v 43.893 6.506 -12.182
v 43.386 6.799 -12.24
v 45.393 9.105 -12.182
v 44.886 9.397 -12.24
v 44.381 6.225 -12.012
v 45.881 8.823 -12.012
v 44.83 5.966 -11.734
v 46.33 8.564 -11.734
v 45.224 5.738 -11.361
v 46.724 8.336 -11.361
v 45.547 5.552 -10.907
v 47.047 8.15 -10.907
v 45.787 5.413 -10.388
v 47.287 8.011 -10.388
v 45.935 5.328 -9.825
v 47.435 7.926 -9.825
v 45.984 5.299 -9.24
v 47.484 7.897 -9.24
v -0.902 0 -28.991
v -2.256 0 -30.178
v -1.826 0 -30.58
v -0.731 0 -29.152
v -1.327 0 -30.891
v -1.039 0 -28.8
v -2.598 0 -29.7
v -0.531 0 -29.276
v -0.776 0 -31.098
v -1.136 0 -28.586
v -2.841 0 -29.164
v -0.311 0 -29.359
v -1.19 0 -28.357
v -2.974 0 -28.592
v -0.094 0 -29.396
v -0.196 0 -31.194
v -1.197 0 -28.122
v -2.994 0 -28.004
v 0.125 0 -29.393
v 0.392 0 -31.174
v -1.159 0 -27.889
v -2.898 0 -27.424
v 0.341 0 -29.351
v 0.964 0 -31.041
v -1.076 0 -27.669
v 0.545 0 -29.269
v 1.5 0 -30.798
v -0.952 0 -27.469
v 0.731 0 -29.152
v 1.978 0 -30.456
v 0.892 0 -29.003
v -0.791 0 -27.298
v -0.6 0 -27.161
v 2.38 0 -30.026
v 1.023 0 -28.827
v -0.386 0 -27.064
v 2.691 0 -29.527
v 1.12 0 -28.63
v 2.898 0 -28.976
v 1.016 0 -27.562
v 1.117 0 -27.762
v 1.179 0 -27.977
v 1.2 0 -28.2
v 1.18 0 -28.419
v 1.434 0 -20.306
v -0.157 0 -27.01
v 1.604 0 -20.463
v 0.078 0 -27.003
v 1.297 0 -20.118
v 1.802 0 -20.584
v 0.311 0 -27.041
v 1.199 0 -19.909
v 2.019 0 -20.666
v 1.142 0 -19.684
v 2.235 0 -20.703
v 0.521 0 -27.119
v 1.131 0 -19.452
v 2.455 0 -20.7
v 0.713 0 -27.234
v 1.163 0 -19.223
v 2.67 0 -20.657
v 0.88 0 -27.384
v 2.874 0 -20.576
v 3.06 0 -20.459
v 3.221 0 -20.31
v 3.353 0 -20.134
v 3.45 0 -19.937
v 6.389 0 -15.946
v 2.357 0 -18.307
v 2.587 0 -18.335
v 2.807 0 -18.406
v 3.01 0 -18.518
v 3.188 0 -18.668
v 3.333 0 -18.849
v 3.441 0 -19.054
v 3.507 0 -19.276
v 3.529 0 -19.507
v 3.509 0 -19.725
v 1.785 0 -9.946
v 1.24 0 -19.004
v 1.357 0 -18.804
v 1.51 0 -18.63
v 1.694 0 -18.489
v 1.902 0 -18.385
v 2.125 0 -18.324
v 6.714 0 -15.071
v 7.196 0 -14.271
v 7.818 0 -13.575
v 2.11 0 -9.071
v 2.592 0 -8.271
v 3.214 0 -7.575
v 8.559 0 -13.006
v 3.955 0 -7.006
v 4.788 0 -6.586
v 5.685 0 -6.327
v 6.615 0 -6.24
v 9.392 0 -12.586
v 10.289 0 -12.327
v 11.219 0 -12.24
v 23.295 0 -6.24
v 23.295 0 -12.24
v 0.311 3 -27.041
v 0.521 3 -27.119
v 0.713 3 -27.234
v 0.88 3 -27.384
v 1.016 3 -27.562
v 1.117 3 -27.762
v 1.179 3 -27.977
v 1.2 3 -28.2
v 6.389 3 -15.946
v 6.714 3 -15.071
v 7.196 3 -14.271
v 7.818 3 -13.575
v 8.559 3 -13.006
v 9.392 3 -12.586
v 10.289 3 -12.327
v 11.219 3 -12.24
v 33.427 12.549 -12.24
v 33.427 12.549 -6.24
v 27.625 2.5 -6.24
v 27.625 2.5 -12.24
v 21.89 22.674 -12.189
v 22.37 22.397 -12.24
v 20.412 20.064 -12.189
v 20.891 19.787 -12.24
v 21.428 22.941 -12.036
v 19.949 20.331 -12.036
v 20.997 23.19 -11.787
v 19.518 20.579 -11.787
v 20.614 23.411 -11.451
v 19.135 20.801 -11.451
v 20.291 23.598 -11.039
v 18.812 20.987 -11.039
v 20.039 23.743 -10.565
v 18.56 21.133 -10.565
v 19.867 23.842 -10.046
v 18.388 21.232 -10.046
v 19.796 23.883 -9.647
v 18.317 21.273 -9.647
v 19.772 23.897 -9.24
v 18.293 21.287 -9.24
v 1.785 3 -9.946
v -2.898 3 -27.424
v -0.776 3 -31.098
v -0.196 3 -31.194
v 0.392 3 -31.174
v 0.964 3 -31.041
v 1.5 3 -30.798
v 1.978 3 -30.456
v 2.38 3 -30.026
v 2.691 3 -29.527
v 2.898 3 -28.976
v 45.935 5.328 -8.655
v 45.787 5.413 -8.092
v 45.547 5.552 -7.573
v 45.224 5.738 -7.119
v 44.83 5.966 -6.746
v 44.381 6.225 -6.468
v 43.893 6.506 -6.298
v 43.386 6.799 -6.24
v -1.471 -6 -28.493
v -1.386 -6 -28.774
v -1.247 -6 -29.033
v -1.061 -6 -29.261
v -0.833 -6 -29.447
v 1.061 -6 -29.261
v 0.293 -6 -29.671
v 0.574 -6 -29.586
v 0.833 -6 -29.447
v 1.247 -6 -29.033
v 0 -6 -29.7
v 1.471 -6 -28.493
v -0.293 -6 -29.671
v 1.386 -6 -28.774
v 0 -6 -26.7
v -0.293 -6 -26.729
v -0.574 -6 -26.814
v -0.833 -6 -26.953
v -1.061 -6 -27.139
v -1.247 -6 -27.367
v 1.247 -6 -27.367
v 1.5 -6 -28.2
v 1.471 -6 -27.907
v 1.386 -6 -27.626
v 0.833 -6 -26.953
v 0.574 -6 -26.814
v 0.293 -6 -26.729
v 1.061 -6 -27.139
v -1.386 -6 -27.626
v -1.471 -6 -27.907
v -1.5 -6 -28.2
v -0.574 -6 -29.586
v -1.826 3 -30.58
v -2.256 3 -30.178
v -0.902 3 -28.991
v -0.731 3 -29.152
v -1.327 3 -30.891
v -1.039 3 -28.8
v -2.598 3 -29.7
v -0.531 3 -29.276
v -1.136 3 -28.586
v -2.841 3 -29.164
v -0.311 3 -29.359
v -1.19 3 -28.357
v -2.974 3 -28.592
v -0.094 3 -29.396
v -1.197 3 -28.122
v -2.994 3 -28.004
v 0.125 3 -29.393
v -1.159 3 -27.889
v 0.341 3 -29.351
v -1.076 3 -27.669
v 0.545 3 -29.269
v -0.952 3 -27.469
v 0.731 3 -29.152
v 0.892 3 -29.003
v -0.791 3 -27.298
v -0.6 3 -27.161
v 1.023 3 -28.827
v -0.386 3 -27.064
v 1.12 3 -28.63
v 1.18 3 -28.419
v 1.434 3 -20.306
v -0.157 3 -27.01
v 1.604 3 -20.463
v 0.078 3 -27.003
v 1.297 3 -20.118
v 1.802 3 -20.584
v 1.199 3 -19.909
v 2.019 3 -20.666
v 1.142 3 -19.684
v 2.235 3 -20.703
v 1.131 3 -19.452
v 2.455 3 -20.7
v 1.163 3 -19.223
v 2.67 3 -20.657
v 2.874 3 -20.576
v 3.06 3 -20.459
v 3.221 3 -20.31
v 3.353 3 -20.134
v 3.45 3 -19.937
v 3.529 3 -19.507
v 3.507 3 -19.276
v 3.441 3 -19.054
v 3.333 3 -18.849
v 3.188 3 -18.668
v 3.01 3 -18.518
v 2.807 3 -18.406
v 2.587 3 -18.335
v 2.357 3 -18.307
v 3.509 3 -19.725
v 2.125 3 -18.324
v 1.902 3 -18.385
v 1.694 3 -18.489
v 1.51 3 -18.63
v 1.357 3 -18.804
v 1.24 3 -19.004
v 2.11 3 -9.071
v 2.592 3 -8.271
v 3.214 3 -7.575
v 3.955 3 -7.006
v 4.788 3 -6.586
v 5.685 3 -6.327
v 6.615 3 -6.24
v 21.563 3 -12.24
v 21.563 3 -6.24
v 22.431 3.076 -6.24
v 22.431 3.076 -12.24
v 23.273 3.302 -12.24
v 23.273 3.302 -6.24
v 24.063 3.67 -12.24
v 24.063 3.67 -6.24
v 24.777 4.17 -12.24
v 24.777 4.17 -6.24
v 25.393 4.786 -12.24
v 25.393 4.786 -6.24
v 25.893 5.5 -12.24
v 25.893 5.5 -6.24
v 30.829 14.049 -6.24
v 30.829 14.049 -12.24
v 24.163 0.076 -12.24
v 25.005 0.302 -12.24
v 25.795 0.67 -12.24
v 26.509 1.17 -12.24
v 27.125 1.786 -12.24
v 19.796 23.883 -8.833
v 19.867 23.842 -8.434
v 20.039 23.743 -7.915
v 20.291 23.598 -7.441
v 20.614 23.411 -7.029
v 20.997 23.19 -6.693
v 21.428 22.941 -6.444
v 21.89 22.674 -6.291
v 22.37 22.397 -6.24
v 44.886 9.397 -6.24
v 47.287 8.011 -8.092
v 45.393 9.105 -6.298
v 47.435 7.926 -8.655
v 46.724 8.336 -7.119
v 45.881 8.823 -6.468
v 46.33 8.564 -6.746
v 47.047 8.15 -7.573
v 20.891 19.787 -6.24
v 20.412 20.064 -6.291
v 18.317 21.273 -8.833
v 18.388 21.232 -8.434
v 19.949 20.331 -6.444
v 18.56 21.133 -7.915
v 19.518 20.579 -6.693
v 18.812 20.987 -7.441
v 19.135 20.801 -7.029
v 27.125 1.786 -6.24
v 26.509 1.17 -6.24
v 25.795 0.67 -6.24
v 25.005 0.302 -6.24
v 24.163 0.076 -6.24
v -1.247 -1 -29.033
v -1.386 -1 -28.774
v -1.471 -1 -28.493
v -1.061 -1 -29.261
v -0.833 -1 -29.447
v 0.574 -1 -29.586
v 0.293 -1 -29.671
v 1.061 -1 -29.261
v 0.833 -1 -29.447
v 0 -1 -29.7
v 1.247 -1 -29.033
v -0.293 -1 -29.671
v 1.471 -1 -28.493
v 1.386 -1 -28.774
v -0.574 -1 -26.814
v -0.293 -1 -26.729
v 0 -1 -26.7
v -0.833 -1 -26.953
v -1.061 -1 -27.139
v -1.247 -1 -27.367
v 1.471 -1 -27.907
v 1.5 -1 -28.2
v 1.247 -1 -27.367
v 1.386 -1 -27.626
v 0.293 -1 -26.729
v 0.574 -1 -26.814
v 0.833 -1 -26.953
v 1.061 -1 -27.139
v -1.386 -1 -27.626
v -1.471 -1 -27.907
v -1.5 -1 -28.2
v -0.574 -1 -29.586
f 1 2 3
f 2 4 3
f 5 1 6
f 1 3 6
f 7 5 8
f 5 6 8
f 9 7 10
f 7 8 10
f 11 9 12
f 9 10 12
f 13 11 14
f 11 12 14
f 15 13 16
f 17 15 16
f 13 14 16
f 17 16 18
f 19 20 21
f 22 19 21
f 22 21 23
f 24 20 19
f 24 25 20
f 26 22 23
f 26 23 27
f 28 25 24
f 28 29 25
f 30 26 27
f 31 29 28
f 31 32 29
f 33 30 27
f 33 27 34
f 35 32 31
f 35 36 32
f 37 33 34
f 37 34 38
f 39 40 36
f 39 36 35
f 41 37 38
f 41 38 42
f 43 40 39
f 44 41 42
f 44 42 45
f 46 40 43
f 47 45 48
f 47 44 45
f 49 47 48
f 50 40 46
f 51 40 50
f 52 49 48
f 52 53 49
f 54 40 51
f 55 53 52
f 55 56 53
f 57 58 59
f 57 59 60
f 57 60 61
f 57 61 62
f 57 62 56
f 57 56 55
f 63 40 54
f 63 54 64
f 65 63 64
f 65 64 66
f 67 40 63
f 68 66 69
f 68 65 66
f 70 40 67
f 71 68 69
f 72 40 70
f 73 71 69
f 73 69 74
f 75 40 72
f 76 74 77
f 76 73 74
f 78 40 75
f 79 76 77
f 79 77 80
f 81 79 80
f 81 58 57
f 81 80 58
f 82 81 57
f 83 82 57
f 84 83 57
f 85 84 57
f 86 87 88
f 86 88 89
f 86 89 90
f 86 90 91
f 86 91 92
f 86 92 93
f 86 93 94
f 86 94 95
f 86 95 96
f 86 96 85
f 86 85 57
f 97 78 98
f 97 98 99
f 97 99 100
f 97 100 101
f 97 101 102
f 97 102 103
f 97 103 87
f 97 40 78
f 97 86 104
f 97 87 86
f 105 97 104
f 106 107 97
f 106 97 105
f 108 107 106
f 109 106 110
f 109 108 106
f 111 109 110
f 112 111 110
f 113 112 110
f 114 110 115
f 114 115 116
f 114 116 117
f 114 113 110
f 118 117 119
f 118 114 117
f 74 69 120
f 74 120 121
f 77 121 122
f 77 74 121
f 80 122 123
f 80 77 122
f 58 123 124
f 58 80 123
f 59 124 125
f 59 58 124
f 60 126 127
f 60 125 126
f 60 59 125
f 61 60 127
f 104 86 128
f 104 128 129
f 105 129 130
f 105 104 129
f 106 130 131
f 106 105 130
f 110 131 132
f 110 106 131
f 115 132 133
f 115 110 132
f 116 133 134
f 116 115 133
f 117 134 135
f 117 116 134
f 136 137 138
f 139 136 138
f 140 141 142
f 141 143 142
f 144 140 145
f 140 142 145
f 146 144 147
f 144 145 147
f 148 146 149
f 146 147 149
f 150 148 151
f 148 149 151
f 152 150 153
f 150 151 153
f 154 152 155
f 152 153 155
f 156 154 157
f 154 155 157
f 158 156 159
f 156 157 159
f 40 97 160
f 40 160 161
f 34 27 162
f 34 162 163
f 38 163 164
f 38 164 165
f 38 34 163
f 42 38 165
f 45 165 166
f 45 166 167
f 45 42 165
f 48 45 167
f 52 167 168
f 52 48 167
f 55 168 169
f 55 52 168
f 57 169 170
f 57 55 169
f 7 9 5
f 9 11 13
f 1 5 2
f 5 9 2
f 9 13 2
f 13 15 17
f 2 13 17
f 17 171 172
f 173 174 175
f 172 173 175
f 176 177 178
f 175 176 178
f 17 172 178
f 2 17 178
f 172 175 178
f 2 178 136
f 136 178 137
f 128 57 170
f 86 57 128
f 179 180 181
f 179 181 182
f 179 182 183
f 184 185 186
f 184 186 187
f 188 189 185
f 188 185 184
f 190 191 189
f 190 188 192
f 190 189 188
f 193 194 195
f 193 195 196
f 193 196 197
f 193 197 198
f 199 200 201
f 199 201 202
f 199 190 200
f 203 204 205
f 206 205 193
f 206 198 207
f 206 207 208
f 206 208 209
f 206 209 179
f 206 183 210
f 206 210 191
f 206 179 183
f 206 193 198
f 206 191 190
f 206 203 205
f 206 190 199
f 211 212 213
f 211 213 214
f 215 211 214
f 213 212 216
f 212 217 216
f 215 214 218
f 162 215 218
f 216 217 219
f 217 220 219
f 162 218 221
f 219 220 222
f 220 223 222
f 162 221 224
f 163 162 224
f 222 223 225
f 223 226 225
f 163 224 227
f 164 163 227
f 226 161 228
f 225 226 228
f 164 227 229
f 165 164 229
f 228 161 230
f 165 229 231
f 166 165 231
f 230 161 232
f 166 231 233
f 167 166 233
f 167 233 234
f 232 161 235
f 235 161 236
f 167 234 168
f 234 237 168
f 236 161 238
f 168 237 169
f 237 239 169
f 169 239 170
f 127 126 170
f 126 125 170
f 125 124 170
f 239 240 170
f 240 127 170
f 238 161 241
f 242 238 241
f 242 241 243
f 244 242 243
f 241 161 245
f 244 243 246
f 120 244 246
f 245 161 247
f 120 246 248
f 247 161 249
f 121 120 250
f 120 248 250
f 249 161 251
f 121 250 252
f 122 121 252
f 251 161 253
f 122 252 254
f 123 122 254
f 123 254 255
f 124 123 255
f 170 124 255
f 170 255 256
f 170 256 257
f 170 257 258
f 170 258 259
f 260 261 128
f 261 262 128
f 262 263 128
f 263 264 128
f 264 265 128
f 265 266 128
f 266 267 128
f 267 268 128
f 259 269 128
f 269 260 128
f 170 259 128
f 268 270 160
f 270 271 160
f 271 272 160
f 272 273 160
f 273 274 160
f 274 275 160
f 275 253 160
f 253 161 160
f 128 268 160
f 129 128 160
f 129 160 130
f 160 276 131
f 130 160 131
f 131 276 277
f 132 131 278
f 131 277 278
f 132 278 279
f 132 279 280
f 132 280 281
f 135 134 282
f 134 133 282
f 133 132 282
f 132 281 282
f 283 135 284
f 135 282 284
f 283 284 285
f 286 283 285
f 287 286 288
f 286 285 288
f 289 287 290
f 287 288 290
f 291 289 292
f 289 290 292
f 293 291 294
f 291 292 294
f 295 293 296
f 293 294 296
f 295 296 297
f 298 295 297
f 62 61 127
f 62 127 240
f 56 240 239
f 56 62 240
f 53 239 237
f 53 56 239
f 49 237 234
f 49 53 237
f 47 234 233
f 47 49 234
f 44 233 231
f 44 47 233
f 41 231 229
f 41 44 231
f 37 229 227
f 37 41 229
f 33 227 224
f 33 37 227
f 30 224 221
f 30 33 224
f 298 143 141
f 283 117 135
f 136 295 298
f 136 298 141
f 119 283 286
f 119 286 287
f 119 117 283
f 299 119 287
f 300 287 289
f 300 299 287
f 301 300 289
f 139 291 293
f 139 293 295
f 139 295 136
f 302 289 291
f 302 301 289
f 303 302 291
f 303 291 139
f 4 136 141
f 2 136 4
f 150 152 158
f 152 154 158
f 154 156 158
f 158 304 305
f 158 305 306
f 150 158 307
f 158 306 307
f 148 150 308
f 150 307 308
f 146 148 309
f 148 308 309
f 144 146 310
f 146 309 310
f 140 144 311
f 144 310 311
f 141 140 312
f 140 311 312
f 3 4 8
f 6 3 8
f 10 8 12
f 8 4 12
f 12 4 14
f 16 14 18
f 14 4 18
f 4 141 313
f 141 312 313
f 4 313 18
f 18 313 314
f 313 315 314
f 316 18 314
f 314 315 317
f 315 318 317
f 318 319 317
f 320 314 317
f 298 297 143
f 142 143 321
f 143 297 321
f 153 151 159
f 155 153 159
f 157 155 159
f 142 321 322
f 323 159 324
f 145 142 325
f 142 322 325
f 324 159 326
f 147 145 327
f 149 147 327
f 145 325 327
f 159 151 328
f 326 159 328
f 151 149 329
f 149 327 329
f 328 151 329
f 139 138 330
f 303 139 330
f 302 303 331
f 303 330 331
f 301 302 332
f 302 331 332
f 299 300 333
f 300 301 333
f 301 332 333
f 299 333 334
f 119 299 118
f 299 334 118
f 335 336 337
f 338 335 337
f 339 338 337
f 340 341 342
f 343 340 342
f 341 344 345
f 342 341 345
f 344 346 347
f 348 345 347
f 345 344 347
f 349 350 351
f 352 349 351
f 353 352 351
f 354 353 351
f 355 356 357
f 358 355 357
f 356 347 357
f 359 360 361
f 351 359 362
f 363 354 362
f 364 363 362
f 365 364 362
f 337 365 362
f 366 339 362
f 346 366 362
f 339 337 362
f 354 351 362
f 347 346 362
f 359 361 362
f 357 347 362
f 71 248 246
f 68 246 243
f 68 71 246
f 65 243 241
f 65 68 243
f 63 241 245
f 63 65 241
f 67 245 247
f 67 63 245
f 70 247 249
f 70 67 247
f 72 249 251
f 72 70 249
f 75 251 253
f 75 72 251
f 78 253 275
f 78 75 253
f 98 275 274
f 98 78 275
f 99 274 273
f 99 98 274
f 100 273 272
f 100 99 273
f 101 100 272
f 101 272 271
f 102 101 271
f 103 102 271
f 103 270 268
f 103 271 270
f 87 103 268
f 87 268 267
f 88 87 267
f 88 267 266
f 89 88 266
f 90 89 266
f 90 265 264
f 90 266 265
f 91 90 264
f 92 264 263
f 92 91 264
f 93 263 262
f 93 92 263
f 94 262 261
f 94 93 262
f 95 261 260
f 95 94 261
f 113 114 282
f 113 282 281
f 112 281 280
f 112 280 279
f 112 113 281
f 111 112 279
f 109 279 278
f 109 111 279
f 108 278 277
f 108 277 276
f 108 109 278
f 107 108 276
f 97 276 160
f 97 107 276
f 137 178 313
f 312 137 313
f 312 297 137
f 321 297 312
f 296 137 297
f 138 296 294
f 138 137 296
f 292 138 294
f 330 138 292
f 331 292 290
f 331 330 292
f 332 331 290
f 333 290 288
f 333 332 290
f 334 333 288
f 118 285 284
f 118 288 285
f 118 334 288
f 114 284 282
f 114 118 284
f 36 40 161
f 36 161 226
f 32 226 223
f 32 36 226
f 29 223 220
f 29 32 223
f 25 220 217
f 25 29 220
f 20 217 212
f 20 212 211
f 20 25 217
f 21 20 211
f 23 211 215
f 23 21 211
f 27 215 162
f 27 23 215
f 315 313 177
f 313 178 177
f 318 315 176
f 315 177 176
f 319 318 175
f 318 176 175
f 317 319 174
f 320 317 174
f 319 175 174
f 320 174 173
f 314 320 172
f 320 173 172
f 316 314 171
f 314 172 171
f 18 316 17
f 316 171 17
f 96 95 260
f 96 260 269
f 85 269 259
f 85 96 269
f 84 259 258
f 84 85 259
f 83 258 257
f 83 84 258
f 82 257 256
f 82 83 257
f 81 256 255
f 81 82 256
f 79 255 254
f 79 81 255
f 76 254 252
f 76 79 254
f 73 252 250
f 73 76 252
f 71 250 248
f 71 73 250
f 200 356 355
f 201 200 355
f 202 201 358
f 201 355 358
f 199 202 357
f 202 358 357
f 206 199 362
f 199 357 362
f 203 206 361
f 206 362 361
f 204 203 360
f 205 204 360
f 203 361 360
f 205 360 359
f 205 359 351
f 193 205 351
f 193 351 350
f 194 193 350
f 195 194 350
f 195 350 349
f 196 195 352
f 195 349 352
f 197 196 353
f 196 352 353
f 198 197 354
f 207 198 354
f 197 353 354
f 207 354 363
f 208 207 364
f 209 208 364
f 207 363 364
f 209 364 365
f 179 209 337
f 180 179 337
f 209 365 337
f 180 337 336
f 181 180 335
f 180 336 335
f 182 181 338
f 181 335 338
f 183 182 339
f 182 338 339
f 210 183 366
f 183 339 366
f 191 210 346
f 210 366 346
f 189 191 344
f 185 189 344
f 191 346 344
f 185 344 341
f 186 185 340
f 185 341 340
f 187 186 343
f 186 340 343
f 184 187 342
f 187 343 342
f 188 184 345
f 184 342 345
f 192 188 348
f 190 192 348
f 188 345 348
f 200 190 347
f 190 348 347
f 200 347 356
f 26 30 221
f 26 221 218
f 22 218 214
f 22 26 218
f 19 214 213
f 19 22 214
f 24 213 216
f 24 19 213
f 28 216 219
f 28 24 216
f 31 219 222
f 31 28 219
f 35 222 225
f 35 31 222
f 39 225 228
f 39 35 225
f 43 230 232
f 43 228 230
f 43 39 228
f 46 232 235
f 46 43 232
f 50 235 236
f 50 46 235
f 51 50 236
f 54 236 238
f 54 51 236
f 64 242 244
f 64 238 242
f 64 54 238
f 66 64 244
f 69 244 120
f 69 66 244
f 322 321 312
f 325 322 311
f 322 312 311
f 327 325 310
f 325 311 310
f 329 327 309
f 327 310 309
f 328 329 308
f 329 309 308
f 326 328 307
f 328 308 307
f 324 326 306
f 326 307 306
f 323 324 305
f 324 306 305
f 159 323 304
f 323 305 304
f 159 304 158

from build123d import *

# Parameters (mm, degrees)
F3_R     = 1.5
F4_DEPTH = 5
F5_DEPTH = 100
F0_W     = 123.8063722849
F0_H     = 159.0860895813
F6_DEPTH = 31.2010005245
F7_R     = 2.99999


# Not quite as in the source:
# - a fillet or chamfer is up to 0.001 mm smaller than in the source, because OpenCascade refuses the exact size


with BuildPart() as f4:
    # F3 (on offset) → F4 (new body)
    with BuildSketch(Plane.XZ.offset(1)):
        with Locations((0, -28.2000005245)):
            Circle(F3_R)
    extrude(amount=F4_DEPTH)


with BuildPart() as f5:
    # F1 (on Front) → F5 (new body)
    with BuildSketch(Plane.XZ):
        with BuildLine():
            Line((1.7853418934, -9.9459039539), (-2.8977774789, -27.4235433892))
            ThreePointArc((-2.8977774789, -27.4235433892), (-2.5980762114, -29.7000005245), (-0.7764571353, -31.0977780034))
            ThreePointArc((-0.7764571353, -31.0977780034), (1.5, -30.7980767359), (2.8977774789, -28.9764576598))
            Line((2.8977774789, -28.9764576598), (6.3893038213, -15.9459039539))
            ThreePointArc((6.3893038213, -15.9459039539), (8.1751258077, -13.273232478), (11.2189329527, -12.2399991794))
            Line((11.2189329527, -12.2399991794), (56.5063462641, -12.2399991794))
            Line((56.5063462641, -12.2399991794), (56.5063462641, -6.2399991794))
            Line((56.5063462641, -6.2399991794), (6.6149710249, -6.2399991794))
            ThreePointArc((6.6149710249, -6.2399991794), (3.5711638798, -7.273232478), (1.7853418934, -9.9459039539))
        make_face()
        with BuildLine():
            ThreePointArc((1.2, -28.2000005245), (0.7305137148, -29.1520245329), (-0.3105828541, -29.3591115161))
            ThreePointArc((-0.3105828541, -29.3591115161), (-1.1591109915, -27.8894176704), (0.3105828541, -27.040889533))
            ThreePointArc((0.3105828541, -27.040889533), (0.9520240083, -27.4694868097), (1.2, -28.2000005245))
        make_face(mode=Mode.SUBTRACT)
        with BuildLine():
            ThreePointArc((3.5293714059, -19.5066680879), (3.0598851207, -20.4586920963), (2.0187885518, -20.6657790795))
            ThreePointArc((2.0187885518, -20.6657790795), (1.5988576911, -18.5546440796), (3.5293714059, -19.5066680879))
        make_face(mode=Mode.SUBTRACT)
    extrude(amount=-F5_DEPTH)

    # F0 (on Top) → F6 (cut, through all)
    with BuildSketch(Plane.XY):
        with Locations((20.0330018997, 51.0744024068)):
            Rectangle(F0_W, F0_H)
        with BuildLine():
            Line((30.8290268609, 14.0490771528), (18.2928432391, 21.2868461414))
            Line((18.2928432391, 21.2868461414), (19.771658506, 23.8971533641))
            Line((19.771658506, 23.8971533641), (47.4844714271, 7.8971533641))
            Line((47.4844714271, 7.8971533641), (45.9844714271, 5.2990771528))
            Line((45.9844714271, 5.2990771528), (33.4271030722, 12.5490771528))
            Line((33.4271030722, 12.5490771528), (27.625265673, 2.5))
            ThreePointArc((27.625265673, 2.5), (25.7951386541, 0.6698729811), (23.2951386541, 0))
            Line((23.2951386541, 0), (0, 0))
            Line((0, 0), (-9.2670181766, 0))
            Line((-9.2670181766, 0), (-9.2670181766, 3))
            Line((-9.2670181766, 3), (0, 3))
            Line((0, 3), (21.5630878465, 3))
            ThreePointArc((21.5630878465, 3), (24.0630878465, 3.6698729811), (25.8932148654, 5.5))
            Line((25.8932148654, 5.5), (30.8290268609, 14.0490771528))
        make_face(mode=Mode.SUBTRACT)
        with BuildLine():
            ThreePointArc((186.4293499082, 37.2767830718), (189.1206068421, 41.7118372377), (194.29723209, 41.3725432932))
            Line((194.29723209, 41.3725432932), (212.3185770643, 28.7538616935))
            Line((212.3185770643, 28.7538616935), (214.0393063734, 31.2113178264))
            Line((214.0393063734, 31.2113178264), (196.017961399, 43.8299994261))
            ThreePointArc((196.017961399, 43.8299994261), (187.7353610024, 44.3728697372), (183.4293499082, 37.2767830718))
            Line((183.4293499082, 37.2767830718), (183.4293499082, 8.5356936807))
            ThreePointArc((183.4293499082, 8.5356936807), (181.9648838142, 5.0001597747), (178.4293499082, 3.5356936807))
            Line((178.4293499082, 3.5356936807), (134.4964219123, 3.5356936807))
            Line((134.4964219123, 3.5356936807), (134.4964219123, 0.5356936807))
            Line((134.4964219123, 0.5356936807), (178.4293499082, 0.5356936807))
            ThreePointArc((178.4293499082, 0.5356936807), (184.0862041577, 2.8788394312), (186.4293499082, 8.5356936807))
            Line((186.4293499082, 8.5356936807), (186.4293499082, 37.2767830718))
        make_face()
    extrude(amount=-F6_DEPTH, mode=Mode.SUBTRACT)

    # F7 (radius 3 in the source; OpenCascade refuses exactly that, so slightly less here)
    f7_edges = [f5.edges().sort_by_distance(p)[0] for p in [
        (19.032251, 22.592, -6.239999),
        (46.734471, 6.598115, -6.239999),
        (46.734471, 6.598115, -12.239999),
        (19.032251, 22.592, -12.239999),
    ]]
    fillet(f7_edges, radius=F7_R)


solid = Compound([f4.part, f5.part])
